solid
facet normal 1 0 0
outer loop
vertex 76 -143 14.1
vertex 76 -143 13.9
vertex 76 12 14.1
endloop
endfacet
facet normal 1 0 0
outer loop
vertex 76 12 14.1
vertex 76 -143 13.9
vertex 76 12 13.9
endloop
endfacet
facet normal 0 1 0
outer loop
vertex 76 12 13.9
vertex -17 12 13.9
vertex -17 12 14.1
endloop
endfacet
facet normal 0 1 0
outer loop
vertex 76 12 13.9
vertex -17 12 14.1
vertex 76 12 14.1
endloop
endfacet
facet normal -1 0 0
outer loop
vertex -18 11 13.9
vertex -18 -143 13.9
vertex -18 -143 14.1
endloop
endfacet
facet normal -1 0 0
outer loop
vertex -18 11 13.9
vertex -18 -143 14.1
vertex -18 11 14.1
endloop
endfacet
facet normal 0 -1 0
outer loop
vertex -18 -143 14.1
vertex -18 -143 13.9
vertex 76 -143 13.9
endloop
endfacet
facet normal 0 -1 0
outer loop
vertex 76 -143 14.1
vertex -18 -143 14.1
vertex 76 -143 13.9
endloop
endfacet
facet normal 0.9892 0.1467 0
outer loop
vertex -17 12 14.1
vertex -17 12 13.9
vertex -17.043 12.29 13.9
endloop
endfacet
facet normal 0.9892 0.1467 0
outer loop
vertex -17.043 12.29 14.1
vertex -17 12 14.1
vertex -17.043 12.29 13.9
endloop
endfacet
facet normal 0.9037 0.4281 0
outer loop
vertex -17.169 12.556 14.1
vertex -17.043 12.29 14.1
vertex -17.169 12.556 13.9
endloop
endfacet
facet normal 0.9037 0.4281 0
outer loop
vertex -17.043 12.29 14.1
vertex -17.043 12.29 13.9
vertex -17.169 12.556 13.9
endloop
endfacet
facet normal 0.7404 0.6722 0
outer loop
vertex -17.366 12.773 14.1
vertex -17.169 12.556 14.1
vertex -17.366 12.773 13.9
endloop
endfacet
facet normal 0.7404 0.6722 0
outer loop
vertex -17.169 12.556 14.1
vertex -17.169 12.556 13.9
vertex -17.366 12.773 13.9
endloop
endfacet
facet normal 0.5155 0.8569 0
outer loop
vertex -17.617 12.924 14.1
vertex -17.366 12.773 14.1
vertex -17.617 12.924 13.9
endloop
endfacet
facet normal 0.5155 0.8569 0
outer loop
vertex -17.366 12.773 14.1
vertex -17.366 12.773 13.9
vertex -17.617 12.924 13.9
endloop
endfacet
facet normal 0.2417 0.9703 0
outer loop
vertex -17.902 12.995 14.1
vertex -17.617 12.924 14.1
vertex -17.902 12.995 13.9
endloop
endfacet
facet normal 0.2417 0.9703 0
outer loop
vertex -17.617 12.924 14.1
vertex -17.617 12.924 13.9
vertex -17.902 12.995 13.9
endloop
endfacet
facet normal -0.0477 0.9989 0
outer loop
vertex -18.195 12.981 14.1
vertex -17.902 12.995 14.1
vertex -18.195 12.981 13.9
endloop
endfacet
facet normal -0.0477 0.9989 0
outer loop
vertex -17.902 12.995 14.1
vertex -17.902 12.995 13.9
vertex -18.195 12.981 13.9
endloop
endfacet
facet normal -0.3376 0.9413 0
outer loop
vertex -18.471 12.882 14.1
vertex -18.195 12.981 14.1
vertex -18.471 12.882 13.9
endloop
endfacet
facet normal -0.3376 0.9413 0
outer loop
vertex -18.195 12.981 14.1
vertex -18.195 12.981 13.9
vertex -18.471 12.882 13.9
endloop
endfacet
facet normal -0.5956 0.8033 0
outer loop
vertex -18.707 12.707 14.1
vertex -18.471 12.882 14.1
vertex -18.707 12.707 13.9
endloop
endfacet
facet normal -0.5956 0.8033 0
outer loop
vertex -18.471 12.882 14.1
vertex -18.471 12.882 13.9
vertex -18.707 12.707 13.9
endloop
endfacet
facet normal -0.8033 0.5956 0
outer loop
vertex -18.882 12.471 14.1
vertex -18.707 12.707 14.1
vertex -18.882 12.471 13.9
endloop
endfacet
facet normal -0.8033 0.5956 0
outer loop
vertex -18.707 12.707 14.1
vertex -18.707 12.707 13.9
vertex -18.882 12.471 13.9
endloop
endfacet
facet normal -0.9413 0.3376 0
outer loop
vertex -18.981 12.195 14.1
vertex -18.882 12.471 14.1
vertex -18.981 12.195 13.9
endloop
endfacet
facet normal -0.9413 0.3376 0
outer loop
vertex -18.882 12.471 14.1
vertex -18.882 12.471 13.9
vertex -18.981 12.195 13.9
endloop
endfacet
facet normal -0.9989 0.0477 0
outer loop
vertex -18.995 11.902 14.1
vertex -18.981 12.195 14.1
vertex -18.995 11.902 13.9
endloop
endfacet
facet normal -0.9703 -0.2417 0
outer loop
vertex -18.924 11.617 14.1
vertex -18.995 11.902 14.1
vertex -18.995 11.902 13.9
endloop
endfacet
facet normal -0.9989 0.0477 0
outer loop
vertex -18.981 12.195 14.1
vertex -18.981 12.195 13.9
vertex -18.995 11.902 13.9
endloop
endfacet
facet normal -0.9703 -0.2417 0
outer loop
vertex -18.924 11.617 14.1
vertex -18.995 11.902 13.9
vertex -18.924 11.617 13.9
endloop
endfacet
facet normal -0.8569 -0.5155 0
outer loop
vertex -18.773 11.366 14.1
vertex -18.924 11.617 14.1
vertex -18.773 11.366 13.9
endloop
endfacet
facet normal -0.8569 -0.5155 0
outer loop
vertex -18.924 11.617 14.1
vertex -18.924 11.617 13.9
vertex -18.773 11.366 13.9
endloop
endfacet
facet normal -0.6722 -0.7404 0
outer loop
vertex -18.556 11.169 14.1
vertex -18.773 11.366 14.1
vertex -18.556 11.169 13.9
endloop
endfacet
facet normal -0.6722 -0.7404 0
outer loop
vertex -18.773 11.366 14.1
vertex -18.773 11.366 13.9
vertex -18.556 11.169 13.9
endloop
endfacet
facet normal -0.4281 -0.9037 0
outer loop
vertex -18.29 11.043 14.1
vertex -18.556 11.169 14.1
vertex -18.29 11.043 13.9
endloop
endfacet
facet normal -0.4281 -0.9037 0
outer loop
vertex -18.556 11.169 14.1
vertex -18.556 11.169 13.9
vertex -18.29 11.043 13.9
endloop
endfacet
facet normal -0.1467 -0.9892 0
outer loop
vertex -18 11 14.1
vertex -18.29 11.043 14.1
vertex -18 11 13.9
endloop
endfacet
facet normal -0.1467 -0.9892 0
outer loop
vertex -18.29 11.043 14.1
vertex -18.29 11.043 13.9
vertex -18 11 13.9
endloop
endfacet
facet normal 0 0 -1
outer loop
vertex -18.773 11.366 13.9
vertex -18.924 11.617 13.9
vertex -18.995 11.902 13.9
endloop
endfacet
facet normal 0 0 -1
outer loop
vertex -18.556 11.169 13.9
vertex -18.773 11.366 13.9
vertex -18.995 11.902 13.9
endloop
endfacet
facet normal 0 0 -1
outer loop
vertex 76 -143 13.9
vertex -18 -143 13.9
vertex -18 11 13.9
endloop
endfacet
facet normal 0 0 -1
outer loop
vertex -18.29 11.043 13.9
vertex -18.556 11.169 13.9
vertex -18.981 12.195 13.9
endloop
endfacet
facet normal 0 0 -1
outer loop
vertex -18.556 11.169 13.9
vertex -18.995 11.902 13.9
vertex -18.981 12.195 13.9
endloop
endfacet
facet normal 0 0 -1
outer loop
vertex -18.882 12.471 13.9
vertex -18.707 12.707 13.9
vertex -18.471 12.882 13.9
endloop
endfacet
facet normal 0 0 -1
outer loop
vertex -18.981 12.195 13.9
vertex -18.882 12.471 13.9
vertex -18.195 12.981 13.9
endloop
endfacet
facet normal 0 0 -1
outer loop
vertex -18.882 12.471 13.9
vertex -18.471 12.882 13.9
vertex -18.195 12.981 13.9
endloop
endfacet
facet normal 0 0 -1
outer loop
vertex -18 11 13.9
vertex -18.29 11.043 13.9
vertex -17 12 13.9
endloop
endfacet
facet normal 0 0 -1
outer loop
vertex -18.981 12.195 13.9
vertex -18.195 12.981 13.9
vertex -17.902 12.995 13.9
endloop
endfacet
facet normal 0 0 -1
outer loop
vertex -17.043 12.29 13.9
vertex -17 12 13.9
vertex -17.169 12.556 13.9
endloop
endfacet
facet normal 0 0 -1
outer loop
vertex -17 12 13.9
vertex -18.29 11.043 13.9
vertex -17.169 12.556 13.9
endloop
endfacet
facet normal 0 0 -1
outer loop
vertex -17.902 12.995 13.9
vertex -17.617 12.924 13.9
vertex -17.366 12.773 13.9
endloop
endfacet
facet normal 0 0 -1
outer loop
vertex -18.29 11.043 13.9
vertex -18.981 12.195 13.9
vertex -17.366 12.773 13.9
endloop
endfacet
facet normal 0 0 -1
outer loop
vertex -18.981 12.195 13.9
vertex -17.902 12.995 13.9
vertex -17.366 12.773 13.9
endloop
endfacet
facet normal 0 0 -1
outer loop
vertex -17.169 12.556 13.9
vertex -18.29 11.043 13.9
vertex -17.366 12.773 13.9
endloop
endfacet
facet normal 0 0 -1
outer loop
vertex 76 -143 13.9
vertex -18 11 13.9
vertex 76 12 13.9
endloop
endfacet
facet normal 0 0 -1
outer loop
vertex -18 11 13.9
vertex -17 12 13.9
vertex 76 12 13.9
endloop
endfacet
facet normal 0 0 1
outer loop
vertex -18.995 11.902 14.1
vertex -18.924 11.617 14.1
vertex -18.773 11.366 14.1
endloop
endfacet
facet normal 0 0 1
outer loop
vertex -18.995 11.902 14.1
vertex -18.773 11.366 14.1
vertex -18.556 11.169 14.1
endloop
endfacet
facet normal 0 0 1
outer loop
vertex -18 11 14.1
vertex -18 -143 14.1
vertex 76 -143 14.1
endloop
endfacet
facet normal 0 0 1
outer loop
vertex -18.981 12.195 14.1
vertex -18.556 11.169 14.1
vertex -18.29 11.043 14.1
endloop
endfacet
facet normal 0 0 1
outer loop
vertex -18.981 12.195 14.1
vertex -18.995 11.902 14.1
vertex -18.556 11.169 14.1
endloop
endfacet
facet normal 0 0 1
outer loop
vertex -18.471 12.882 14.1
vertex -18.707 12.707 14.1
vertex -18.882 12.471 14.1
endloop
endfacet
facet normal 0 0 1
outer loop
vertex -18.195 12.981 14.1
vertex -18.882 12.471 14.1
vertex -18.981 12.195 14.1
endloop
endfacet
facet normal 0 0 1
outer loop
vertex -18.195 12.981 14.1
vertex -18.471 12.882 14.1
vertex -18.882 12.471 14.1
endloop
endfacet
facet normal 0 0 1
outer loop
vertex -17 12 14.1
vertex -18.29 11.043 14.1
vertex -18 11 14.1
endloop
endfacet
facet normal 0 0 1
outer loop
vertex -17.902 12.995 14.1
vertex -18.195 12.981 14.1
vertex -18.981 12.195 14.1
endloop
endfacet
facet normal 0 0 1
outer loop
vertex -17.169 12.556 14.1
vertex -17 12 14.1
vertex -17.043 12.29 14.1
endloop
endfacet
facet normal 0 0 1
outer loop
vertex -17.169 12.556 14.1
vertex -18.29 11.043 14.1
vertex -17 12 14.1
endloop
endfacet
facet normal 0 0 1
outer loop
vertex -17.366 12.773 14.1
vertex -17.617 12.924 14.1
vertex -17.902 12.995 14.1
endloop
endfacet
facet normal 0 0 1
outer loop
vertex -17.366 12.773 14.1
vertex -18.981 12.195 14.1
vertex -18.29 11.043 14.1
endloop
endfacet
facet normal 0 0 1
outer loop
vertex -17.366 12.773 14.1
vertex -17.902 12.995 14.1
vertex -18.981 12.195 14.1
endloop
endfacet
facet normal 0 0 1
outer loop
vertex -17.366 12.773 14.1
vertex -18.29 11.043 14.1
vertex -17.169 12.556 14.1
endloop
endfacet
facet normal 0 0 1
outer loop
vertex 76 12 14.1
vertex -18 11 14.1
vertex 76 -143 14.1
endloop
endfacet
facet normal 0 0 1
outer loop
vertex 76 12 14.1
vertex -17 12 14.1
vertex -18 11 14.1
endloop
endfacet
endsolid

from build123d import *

# Parameters (mm, degrees)
CYLINDER_R     = 1
CYLINDER_DEPTH = 0.2
BOX003_W       = 94
BOX003_H       = 155
BOX003_DEPTH   = 0.2


with BuildPart() as cylinder:
    # Cylinder → Cylinder (new body)
    with BuildSketch(Plane(origin=(-18, 12, 13.9), x_dir=(1, 0, 0), z_dir=(0, 0, 1))):
        Circle(CYLINDER_R)
    extrude(amount=CYLINDER_DEPTH)


with BuildPart() as fusion:
    # Box003 → Box003 (new body)
    with BuildSketch(Plane(origin=(-18, -143, 13.9), x_dir=(1, 0, 0), z_dir=(0, 0, 1))):
        with Locations((47, 77.5)):
            Rectangle(BOX003_W, BOX003_H)
    extrude(amount=BOX003_DEPTH)

    # Fusion: union Cylinder
    add(cylinder.part)


solid = fusion.part
